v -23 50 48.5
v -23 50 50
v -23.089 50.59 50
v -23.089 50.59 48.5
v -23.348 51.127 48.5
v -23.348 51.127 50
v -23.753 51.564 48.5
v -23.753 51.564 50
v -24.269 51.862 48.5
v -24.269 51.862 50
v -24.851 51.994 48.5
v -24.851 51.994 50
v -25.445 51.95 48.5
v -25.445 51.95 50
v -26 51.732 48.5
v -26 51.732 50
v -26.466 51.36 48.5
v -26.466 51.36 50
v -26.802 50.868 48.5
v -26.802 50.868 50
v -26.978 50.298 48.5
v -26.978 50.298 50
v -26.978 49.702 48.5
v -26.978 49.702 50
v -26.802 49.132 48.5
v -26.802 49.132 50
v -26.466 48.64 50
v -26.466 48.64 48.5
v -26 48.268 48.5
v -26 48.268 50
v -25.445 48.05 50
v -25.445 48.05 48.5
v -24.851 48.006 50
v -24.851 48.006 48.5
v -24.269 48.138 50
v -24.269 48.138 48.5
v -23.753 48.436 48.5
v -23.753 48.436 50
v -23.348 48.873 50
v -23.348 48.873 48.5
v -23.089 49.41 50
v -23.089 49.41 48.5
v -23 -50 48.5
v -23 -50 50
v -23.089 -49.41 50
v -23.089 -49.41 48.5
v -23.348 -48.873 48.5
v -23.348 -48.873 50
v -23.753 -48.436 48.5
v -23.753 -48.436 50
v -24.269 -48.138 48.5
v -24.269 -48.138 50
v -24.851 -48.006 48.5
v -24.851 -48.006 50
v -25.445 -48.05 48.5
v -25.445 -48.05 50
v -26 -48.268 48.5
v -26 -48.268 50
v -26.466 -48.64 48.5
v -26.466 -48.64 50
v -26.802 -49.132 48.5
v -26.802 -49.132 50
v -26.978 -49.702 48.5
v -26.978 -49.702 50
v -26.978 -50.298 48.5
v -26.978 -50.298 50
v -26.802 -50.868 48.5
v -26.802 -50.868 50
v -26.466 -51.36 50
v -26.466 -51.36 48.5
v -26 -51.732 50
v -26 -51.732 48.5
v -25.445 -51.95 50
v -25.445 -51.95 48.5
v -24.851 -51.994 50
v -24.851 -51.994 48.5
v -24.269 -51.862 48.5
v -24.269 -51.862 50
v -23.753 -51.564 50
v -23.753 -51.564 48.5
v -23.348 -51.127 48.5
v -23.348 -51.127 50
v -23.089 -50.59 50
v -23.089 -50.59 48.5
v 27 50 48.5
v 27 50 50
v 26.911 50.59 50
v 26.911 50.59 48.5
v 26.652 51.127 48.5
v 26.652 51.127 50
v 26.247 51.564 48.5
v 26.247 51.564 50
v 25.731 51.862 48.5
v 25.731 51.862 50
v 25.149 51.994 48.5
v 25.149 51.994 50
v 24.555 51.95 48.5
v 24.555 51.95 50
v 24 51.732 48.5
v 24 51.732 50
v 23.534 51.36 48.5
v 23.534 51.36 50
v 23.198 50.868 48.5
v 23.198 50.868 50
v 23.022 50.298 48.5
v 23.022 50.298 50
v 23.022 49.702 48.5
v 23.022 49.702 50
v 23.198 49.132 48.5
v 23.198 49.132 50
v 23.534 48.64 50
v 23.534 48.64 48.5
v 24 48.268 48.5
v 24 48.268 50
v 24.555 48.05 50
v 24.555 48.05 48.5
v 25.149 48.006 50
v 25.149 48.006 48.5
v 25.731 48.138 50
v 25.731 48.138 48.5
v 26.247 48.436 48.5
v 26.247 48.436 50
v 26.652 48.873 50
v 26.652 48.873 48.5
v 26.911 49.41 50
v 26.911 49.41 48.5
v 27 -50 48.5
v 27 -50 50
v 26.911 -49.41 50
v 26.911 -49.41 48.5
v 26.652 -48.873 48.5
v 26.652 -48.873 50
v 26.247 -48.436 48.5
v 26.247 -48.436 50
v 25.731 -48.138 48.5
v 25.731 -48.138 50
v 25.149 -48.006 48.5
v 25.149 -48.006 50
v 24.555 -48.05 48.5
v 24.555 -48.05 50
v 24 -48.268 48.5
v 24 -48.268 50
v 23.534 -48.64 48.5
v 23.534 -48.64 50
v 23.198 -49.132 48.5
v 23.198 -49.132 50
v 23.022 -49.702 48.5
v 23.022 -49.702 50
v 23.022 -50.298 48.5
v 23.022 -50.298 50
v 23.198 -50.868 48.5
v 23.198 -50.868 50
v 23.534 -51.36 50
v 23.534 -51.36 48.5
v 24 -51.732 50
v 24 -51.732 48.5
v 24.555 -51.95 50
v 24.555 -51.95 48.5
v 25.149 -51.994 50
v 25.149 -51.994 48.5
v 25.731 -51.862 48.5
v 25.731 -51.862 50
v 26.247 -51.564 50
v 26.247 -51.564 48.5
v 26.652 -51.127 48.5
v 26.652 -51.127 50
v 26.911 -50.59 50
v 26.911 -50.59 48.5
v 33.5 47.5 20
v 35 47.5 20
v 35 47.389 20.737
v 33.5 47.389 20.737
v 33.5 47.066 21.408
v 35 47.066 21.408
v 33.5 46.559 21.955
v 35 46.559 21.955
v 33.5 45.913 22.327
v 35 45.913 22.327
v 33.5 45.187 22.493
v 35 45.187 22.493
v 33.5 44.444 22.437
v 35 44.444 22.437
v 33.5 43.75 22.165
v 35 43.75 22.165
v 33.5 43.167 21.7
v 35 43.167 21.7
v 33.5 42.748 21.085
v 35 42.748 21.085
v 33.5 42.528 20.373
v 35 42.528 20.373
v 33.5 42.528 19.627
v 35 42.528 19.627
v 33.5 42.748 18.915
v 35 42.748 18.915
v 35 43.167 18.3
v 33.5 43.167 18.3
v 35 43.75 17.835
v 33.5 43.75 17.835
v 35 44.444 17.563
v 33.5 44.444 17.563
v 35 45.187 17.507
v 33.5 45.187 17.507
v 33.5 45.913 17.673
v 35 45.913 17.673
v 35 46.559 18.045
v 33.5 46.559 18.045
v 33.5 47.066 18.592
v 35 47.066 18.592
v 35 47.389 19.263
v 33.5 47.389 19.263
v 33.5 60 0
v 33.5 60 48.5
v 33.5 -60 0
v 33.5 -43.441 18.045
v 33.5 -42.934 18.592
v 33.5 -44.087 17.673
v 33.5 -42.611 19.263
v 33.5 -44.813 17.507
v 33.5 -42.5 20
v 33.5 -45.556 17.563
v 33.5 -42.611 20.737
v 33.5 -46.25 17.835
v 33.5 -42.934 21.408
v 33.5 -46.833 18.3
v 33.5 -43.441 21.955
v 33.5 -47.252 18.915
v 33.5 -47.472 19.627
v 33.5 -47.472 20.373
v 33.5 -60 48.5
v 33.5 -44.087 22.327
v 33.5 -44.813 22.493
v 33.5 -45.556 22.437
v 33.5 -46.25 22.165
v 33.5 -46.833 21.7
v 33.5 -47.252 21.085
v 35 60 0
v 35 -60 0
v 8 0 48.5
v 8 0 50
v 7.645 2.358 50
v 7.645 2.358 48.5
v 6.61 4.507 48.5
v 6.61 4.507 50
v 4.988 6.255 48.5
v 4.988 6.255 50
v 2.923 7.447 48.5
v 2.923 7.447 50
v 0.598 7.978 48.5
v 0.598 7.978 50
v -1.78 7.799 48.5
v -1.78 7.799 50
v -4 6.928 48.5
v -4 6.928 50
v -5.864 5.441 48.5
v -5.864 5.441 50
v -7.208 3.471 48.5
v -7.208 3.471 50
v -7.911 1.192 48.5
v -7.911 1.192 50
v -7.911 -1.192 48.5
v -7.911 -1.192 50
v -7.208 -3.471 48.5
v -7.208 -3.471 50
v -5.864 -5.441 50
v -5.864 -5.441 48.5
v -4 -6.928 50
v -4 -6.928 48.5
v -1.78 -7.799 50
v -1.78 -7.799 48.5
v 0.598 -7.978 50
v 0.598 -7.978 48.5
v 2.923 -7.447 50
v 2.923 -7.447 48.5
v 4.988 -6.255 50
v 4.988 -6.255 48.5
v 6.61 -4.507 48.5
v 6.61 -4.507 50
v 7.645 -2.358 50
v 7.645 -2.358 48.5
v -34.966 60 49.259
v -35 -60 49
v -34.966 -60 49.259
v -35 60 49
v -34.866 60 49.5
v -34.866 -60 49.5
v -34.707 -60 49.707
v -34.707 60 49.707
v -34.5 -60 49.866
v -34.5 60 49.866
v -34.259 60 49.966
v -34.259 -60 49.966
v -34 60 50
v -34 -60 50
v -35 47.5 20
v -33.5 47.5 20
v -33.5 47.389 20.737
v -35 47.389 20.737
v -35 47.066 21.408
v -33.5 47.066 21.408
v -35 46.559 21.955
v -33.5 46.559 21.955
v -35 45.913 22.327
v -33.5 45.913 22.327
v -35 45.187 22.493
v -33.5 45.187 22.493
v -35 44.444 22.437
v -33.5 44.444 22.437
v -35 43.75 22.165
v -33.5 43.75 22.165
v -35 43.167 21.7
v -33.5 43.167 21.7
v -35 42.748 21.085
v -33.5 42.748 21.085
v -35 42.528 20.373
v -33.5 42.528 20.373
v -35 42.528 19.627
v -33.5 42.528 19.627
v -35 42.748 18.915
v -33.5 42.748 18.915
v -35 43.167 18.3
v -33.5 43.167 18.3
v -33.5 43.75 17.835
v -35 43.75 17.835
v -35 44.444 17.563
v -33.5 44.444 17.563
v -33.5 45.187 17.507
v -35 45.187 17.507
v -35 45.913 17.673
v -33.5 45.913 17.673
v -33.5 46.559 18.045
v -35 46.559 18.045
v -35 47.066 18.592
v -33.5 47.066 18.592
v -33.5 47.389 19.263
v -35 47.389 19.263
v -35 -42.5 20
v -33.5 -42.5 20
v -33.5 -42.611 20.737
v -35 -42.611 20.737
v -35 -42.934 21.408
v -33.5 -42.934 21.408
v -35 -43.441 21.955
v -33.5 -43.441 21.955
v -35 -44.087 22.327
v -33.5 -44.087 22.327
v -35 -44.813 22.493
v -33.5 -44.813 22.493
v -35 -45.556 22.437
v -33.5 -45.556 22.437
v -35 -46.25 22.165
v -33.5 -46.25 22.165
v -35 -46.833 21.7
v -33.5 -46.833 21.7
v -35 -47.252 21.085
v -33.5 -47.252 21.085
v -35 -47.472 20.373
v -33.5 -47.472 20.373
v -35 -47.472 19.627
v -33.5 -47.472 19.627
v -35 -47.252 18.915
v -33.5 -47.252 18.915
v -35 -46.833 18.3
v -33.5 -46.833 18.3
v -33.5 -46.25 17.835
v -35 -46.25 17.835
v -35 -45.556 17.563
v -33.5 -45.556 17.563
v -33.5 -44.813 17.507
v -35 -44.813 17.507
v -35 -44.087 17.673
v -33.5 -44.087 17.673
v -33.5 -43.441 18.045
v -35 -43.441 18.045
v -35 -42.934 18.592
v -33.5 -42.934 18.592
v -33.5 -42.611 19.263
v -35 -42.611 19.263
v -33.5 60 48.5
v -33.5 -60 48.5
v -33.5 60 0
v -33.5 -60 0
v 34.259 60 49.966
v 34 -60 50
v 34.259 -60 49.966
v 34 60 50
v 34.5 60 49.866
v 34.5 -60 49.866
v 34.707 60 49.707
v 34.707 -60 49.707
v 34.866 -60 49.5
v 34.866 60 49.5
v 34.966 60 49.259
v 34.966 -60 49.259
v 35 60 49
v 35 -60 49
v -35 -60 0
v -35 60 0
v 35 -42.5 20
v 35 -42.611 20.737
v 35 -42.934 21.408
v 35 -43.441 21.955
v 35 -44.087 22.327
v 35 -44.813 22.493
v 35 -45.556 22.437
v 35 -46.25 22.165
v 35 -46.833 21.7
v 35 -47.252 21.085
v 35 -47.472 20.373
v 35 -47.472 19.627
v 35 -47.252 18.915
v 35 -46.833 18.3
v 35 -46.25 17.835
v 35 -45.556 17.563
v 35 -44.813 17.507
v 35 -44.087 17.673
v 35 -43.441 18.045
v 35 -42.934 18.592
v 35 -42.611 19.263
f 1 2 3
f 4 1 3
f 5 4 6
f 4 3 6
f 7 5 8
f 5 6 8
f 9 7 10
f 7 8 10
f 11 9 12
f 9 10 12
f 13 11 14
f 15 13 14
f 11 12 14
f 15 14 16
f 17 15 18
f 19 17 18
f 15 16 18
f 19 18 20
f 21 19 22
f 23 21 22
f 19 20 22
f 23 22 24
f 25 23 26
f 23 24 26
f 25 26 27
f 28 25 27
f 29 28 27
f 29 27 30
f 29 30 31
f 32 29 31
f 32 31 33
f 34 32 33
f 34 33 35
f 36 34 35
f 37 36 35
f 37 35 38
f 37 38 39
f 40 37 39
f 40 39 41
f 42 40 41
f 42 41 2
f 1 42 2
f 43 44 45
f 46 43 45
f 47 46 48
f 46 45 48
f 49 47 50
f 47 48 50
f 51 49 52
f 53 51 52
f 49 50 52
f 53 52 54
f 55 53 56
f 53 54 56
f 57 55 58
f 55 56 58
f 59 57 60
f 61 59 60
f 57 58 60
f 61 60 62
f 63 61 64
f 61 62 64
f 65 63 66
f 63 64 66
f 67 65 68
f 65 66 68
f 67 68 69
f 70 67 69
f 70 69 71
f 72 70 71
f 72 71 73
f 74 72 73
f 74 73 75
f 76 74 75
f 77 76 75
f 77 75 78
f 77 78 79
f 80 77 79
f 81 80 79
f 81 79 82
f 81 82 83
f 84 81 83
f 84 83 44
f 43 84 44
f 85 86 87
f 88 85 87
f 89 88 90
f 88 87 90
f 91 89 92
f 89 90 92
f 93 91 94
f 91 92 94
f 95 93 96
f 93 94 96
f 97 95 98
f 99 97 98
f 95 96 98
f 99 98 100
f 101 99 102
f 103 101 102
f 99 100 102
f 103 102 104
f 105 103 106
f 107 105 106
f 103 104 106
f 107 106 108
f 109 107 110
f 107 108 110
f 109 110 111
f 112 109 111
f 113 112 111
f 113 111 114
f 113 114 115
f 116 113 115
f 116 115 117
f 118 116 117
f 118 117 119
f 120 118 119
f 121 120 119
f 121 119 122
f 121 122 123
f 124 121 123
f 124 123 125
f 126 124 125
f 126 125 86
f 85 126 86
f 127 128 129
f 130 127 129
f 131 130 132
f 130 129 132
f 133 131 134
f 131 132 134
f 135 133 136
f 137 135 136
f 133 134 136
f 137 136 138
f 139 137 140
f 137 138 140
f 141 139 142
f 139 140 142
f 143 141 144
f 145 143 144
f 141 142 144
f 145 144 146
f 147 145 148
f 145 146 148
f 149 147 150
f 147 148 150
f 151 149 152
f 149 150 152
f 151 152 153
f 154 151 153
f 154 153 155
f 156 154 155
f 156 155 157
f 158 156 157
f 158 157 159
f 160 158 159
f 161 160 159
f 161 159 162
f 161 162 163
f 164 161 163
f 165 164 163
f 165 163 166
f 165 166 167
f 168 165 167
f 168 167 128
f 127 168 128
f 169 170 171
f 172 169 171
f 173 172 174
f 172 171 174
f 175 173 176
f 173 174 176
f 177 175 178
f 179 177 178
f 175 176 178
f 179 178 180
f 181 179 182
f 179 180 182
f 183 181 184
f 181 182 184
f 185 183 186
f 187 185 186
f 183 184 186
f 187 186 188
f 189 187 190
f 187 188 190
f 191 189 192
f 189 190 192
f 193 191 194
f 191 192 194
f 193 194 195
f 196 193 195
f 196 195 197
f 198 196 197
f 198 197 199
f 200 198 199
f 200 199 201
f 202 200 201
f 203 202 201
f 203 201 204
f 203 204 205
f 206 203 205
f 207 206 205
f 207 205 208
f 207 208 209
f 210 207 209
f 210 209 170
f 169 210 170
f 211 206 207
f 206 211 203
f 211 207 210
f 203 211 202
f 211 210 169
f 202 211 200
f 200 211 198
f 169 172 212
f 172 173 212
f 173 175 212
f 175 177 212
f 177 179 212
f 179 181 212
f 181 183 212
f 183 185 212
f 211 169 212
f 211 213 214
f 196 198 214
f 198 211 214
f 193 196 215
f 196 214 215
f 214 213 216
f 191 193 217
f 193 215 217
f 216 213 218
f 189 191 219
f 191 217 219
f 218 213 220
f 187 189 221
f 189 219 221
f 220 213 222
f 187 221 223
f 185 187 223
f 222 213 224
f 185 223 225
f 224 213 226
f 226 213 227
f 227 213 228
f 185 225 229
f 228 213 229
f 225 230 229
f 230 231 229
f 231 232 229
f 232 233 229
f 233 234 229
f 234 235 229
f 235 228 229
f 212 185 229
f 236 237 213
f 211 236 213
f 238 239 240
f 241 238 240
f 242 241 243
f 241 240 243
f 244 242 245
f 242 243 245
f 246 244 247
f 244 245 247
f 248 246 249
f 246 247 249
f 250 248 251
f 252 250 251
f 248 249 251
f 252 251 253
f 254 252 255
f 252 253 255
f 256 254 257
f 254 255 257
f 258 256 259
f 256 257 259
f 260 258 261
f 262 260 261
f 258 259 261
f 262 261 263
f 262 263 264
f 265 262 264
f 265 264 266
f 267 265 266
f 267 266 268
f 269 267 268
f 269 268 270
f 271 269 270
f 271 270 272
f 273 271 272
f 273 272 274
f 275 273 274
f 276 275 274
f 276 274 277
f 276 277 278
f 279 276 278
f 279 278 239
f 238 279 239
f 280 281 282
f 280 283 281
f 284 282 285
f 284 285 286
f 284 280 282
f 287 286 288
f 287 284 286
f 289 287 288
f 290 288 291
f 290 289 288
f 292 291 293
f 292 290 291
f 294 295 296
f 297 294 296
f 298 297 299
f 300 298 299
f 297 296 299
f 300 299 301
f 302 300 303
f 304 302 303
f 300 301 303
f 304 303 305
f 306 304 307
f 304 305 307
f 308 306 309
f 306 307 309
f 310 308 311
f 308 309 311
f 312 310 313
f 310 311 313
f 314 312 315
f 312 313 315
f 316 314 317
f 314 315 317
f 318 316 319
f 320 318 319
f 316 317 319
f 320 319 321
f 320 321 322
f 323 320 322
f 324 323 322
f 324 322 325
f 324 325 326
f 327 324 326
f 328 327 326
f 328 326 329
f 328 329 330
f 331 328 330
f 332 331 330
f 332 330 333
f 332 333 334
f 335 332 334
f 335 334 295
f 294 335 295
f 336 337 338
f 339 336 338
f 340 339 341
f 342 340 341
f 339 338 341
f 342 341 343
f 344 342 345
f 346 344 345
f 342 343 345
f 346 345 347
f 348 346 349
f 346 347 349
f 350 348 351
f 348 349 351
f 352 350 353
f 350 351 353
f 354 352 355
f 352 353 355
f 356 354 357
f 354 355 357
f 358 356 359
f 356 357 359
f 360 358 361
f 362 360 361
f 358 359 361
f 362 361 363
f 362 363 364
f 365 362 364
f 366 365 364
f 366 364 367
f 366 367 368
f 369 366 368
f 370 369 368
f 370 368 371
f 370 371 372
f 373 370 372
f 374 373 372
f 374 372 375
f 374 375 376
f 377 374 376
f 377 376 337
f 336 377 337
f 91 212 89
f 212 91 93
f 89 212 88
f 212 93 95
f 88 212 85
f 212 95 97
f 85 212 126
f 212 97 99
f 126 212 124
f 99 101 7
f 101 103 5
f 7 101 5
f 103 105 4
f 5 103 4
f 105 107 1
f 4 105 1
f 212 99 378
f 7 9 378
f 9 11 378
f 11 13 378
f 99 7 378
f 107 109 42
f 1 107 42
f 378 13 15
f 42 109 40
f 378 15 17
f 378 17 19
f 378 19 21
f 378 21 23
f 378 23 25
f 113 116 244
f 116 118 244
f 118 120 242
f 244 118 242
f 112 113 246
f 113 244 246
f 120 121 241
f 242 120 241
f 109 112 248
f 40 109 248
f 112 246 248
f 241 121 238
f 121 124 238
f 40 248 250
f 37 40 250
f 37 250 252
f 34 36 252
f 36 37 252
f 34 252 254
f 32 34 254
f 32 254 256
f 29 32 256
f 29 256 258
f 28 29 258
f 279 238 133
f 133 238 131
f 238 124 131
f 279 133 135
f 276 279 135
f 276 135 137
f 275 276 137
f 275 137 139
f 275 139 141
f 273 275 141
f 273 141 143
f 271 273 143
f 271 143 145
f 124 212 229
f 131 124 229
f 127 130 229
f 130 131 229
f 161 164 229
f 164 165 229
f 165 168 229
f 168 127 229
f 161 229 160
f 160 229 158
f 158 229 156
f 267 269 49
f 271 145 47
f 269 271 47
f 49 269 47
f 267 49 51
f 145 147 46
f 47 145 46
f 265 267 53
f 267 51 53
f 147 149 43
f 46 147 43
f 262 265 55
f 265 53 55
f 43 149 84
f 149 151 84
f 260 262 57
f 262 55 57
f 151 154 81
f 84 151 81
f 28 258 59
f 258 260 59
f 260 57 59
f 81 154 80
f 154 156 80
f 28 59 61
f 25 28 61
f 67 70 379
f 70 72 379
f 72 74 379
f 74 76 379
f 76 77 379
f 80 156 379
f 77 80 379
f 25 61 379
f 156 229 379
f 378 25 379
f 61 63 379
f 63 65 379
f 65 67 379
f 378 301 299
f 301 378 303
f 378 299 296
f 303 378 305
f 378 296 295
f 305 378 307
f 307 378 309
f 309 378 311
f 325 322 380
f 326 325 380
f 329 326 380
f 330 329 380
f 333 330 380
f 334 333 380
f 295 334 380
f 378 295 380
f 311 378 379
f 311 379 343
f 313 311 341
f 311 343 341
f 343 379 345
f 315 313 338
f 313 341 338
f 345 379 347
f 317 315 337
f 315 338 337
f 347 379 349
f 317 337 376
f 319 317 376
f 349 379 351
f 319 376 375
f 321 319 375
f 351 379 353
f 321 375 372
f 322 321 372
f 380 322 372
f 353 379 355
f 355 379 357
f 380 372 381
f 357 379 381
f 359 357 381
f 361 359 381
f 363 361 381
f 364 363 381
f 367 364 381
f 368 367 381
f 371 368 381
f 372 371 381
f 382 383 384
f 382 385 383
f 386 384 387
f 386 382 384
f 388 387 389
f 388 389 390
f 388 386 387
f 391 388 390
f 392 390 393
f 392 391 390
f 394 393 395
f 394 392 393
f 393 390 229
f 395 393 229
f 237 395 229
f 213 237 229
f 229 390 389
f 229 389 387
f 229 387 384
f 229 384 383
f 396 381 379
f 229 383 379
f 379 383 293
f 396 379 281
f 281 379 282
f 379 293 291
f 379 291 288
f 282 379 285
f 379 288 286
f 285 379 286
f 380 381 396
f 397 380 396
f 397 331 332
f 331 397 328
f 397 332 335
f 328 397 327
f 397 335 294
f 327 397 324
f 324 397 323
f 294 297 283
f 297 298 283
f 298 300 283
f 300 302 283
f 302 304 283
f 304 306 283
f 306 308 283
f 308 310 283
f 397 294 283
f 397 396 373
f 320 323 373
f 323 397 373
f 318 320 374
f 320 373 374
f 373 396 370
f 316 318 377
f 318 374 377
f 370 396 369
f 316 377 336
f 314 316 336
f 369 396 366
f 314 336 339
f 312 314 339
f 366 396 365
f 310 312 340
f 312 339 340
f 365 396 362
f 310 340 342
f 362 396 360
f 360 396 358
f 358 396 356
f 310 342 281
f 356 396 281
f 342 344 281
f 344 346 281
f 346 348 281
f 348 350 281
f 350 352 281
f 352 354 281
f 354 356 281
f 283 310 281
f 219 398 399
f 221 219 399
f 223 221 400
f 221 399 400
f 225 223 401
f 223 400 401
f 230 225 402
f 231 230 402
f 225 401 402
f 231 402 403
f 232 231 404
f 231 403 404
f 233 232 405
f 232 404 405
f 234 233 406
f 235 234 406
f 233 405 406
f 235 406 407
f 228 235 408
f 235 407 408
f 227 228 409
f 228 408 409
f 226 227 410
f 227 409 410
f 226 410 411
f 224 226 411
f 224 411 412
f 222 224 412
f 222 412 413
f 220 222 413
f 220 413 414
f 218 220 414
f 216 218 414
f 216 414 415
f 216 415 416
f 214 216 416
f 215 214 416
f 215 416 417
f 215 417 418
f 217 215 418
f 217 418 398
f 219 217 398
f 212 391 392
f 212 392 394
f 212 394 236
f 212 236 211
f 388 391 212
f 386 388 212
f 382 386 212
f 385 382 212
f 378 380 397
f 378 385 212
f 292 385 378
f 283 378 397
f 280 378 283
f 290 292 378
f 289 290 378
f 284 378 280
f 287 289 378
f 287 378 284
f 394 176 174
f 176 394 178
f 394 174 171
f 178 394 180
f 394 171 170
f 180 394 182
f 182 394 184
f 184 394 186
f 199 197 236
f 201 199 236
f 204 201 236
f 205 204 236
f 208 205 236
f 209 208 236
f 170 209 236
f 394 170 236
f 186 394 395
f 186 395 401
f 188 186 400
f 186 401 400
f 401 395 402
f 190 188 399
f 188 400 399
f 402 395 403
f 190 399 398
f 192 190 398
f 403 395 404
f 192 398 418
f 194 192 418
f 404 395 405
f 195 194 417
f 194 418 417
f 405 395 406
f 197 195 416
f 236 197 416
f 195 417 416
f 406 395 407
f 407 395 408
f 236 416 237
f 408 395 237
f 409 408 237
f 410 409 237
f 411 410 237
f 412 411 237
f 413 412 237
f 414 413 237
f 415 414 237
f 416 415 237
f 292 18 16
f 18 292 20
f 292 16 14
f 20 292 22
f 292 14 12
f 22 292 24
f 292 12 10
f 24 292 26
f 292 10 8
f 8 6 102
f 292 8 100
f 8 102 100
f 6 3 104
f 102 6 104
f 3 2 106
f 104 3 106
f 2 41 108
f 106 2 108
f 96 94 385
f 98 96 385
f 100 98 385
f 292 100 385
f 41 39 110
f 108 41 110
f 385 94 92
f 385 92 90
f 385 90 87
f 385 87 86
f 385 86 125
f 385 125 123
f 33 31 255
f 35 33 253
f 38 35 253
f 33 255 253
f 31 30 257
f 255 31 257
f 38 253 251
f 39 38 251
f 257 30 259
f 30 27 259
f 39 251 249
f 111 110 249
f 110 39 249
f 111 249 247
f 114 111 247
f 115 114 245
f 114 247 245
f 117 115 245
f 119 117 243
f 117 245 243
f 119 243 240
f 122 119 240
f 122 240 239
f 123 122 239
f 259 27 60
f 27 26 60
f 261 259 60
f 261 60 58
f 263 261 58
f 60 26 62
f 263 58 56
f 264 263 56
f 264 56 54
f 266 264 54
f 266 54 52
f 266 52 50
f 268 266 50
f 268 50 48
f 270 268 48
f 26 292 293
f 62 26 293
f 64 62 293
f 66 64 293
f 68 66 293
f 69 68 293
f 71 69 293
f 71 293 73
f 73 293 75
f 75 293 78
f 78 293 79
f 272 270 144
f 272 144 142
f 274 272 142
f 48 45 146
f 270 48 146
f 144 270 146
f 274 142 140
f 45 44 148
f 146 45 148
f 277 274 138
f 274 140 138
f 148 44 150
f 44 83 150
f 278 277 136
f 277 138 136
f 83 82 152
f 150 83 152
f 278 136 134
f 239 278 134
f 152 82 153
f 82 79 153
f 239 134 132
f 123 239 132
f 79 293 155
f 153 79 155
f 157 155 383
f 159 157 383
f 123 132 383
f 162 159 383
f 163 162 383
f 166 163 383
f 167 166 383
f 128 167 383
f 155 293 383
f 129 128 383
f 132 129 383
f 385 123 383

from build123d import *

# Parameters (mm, degrees)
EXTRUDE001_DEPTH                     = 120
EXTRUDE001_ONTO_SKETCH004_ROLL_ANGLE = 90
FILLET_R                             = 1
SKETCH005_R                          = 2.5
POCKET_DEPTH                         = 71
SKETCH007_R                          = 8
SKETCH007_R_2                        = 2
POCKET001_DEPTH                      = 5


with BuildPart() as part:
    # Sketch004 as drawn → Extrude001 (new)
    with BuildSketch(Plane.XY):
        Polygon((-35, 0), (-35, 50), (35, 50), (35, 0), (33.5, 0), (33.5, 48.5), (-33.5, 48.5), (-33.5, 0), align=None)
    extrude(amount=-EXTRUDE001_DEPTH)


with BuildPart() as part_1:
    # Extrude001 onto Sketch004 roll: moved
    add(part.part.rotate(Axis((0, 0, 0), (1, 0, 0)), EXTRUDE001_ONTO_SKETCH004_ROLL_ANGLE))


with BuildPart() as part_2:
    # Extrude001 onto Sketch004 placement: moved
    add(part_1.part)


with BuildPart() as part_3:
    # Extrude001 placement: moved
    add(part_2.part.moved(Location((0, -60, 0))))

    # Fillet
    fillet_edges = [part_3.edges().sort_by_distance(p)[0] for p in [
        (-35, 0, 50),
        (35, 0, 50),
    ]]
    fillet(fillet_edges, radius=FILLET_R)

    # Sketch005 → Pocket (cut)
    with BuildSketch(Plane.YZ.offset(35)):
        with Locations((-45, 20)):
            Circle(SKETCH005_R)
        with Locations((45, 20)):
            Circle(SKETCH005_R)
    extrude(amount=-POCKET_DEPTH, mode=Mode.SUBTRACT)

    # Sketch007 → Pocket001 (cut)
    with BuildSketch(Plane.XY.offset(50)):
        Circle(SKETCH007_R)
        with Locations((-25, 50)):
            Circle(SKETCH007_R_2)
        with Locations((25, 50)):
            Circle(SKETCH007_R_2)
        with Locations((-25, -50)):
            Circle(SKETCH007_R_2)
        with Locations((25, -50)):
            Circle(SKETCH007_R_2)
    extrude(amount=-POCKET001_DEPTH, mode=Mode.SUBTRACT)


solid = part_3.part
